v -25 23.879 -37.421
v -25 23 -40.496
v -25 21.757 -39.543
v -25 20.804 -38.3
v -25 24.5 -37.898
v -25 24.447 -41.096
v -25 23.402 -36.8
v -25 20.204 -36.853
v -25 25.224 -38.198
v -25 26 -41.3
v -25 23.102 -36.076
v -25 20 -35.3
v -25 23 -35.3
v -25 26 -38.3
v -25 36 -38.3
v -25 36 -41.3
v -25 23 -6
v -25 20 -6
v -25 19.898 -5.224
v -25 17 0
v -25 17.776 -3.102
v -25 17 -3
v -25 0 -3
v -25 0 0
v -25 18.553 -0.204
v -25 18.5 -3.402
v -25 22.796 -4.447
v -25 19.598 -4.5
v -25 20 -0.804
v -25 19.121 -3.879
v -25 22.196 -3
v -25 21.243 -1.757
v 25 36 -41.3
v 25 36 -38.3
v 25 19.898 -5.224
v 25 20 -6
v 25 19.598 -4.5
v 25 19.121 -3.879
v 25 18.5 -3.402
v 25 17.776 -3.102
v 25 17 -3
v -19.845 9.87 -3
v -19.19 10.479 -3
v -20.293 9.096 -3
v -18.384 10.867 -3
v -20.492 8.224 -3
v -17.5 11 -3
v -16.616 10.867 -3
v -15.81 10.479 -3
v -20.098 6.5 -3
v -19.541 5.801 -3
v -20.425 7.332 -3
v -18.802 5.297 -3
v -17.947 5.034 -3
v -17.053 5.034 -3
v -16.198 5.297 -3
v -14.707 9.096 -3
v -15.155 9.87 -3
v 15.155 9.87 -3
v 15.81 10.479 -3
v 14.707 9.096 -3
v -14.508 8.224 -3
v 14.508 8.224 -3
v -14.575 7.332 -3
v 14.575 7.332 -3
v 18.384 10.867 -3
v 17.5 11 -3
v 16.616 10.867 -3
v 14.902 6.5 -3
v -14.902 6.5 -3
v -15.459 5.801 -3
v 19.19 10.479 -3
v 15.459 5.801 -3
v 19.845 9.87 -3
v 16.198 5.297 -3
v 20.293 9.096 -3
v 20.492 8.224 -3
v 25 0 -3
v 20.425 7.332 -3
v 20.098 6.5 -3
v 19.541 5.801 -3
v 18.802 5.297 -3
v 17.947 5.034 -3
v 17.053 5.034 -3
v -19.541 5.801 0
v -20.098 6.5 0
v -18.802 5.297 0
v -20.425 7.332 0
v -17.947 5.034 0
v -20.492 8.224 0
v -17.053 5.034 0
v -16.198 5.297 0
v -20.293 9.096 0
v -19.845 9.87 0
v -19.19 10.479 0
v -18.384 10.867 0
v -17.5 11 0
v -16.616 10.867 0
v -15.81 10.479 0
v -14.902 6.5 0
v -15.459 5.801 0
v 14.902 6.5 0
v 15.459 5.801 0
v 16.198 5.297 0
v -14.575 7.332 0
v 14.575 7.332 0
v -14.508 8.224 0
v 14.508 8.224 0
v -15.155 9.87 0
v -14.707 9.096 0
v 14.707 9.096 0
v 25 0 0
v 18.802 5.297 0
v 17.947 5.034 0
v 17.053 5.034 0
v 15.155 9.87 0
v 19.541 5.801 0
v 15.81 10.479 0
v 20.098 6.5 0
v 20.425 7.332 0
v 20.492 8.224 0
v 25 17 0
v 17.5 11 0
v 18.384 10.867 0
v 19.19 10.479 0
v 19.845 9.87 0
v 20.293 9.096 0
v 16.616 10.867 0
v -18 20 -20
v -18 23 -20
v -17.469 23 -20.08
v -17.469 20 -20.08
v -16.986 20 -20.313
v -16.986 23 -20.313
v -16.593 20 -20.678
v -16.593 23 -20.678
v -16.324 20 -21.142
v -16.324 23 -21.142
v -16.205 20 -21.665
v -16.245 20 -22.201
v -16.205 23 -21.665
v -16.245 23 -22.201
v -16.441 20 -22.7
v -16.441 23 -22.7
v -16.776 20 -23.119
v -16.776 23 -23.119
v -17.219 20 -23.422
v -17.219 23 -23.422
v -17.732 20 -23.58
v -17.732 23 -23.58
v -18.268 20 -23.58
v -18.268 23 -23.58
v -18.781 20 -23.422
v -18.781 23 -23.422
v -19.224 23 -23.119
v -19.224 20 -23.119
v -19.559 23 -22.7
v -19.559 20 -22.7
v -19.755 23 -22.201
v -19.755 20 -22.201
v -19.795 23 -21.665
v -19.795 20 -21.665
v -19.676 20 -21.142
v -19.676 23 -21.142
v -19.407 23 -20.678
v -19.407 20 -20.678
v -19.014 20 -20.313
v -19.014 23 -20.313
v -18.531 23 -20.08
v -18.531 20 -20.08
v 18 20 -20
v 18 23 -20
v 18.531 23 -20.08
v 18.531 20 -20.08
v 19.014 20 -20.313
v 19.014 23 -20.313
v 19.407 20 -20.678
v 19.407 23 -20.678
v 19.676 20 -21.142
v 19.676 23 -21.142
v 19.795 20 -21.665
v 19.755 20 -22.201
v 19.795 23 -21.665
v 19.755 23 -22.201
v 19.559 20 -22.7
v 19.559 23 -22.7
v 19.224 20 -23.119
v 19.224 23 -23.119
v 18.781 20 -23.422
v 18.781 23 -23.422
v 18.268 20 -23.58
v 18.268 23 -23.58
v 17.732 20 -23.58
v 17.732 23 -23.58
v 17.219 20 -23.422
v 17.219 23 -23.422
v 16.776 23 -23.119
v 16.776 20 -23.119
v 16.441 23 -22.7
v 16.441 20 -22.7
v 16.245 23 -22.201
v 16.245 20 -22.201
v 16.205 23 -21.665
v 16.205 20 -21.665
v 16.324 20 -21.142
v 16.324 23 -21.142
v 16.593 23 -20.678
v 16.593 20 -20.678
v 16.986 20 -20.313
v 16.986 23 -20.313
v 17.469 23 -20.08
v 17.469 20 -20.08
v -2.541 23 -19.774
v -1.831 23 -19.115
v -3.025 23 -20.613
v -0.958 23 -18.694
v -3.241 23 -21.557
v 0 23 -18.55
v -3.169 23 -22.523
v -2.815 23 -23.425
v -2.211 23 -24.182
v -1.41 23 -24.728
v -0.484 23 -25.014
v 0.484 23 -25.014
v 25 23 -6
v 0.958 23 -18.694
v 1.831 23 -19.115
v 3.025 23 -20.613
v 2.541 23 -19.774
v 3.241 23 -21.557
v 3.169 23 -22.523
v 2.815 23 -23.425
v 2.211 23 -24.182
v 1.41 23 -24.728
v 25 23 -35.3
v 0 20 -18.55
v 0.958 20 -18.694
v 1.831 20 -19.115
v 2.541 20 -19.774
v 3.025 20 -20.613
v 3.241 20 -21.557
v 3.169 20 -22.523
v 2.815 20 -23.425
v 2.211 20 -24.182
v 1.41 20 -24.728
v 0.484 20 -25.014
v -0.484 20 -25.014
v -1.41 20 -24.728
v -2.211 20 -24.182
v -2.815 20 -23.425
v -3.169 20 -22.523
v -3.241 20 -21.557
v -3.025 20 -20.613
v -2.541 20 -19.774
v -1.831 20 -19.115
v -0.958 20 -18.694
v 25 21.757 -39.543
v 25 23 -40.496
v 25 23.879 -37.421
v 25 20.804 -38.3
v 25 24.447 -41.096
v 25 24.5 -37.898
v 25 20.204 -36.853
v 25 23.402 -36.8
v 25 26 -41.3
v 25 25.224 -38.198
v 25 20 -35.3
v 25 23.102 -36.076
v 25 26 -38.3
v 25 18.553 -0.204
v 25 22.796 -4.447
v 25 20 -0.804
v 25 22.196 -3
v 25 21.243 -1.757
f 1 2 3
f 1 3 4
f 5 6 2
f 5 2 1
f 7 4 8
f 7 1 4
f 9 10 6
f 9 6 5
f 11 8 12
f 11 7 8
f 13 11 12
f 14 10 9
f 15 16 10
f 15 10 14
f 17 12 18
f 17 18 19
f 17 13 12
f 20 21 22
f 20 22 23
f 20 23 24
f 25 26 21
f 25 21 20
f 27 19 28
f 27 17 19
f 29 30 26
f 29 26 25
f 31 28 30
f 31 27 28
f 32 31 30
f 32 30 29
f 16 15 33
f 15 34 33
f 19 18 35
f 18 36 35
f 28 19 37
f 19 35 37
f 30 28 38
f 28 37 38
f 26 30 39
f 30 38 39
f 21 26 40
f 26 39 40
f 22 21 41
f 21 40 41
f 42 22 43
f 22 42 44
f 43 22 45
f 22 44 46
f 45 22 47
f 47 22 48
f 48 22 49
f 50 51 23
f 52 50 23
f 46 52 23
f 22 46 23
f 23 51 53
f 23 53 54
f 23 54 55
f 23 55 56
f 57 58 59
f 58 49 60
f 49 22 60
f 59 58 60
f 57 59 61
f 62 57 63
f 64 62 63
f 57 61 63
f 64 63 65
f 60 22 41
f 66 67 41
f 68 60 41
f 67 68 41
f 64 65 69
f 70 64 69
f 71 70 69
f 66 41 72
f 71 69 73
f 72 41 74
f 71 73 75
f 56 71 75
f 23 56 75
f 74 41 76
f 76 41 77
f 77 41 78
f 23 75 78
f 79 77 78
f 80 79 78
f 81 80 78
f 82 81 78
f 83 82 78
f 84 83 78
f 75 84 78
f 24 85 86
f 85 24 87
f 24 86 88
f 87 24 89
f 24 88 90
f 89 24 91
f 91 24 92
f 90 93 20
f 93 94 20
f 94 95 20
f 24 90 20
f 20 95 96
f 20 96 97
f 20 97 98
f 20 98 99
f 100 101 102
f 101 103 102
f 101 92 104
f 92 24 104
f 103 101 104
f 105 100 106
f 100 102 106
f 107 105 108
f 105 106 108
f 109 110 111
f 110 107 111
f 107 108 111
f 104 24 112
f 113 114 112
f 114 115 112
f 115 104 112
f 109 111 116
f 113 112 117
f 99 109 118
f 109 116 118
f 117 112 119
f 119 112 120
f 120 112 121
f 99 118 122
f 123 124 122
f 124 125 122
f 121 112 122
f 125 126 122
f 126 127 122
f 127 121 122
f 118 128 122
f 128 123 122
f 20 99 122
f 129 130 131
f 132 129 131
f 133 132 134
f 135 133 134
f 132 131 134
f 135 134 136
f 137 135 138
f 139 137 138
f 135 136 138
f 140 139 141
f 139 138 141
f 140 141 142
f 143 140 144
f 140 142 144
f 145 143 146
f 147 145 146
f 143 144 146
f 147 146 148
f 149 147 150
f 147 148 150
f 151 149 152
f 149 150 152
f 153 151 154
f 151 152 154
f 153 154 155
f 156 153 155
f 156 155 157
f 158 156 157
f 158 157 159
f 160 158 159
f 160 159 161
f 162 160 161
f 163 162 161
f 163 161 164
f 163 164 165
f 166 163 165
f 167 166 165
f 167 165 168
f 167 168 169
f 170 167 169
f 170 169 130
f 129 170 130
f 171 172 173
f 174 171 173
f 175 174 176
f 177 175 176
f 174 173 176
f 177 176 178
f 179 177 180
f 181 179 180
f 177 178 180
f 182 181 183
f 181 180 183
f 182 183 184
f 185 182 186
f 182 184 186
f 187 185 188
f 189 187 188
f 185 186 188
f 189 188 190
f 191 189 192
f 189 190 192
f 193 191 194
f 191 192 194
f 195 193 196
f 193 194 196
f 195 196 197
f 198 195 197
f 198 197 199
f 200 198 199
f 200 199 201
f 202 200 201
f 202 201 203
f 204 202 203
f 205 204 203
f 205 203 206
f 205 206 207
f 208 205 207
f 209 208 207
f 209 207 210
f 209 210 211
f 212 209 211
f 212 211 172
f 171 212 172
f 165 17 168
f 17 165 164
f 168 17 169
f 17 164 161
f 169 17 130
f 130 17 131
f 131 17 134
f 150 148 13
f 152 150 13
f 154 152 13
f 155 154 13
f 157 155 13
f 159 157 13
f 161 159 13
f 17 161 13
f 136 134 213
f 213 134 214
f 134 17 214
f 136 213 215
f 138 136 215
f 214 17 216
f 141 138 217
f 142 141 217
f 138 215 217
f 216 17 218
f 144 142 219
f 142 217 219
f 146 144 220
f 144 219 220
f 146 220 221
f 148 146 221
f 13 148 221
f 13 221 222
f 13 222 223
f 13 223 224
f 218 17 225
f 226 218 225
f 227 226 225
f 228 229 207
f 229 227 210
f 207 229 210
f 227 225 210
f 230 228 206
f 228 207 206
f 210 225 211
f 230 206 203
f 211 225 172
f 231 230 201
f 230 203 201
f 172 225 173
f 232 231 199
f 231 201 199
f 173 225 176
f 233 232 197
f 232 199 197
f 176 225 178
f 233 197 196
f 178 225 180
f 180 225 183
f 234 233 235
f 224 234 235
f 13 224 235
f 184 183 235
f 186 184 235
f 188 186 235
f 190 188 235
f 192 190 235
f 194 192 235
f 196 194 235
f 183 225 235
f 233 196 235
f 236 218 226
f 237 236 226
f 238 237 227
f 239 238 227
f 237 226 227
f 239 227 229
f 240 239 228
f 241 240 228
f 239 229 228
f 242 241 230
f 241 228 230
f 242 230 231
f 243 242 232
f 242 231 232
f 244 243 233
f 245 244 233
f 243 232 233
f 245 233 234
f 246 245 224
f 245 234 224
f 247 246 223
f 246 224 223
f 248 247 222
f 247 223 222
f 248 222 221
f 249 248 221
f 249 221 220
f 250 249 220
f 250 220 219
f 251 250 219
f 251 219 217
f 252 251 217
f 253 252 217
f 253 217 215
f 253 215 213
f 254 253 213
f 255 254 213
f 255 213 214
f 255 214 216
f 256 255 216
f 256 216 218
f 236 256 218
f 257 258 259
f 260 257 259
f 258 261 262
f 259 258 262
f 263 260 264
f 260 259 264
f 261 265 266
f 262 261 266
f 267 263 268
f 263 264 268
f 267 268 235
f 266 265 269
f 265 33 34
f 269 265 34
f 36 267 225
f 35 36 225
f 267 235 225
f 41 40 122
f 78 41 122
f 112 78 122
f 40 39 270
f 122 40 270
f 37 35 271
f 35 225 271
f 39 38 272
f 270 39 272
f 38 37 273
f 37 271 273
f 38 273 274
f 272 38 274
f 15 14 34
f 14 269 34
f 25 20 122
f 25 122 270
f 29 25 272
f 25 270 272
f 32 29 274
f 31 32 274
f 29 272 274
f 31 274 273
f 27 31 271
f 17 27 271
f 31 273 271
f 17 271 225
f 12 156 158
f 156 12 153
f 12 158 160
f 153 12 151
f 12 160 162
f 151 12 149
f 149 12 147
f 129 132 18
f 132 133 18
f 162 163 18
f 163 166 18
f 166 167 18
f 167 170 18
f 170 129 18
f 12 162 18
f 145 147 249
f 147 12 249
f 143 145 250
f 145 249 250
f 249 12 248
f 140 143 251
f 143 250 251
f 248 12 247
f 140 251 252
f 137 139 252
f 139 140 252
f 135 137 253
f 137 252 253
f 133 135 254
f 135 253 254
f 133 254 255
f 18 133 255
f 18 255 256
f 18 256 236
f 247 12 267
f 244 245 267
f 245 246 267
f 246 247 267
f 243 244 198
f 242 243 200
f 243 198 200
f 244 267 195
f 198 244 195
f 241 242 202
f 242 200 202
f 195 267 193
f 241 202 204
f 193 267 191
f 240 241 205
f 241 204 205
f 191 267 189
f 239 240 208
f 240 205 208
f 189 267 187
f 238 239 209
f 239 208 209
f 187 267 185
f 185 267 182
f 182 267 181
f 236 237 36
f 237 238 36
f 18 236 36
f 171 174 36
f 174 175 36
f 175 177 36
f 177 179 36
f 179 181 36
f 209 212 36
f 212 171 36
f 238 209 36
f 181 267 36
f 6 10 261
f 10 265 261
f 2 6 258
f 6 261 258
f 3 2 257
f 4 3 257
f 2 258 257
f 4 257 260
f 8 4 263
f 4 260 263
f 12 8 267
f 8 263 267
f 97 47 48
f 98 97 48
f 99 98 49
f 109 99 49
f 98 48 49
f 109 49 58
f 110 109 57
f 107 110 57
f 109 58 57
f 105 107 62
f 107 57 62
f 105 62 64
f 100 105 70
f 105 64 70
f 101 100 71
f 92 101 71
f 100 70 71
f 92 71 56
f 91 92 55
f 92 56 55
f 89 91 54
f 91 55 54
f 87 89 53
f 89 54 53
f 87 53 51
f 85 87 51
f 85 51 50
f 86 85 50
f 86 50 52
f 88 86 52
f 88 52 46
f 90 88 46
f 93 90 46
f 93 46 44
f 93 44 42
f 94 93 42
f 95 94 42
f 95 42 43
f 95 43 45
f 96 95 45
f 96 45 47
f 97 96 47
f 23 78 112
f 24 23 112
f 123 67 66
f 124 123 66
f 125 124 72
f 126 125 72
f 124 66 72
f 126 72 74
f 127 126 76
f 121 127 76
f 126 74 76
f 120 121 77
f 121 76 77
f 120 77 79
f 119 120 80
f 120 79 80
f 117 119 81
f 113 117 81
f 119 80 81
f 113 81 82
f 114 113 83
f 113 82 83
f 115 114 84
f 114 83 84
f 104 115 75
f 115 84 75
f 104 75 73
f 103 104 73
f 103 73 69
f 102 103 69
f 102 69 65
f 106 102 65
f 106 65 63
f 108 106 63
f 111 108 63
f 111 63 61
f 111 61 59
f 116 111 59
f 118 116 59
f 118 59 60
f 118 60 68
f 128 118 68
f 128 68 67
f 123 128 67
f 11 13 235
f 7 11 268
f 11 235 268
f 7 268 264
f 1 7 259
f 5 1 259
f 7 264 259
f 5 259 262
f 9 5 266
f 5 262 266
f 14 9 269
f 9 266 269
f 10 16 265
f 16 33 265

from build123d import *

# Parameters (mm, degrees)
BOSS_EXTRUDE1_DEPTH = 25
CUT_EXTRUDE1_REACH  = 55.476
SKETCH2_R           = 3.25
SKETCH2_R_2         = 1.8
CUT_EXTRUDE2_REACH  = 60.206
SKETCH3_R           = 3


with BuildPart() as part:
    # Sketch1 → Boss-Extrude1 (new, symmetric)
    with BuildSketch(Plane(origin=(0, 0, 0), x_dir=(0, 0, -1), z_dir=(1, 0, 0))):
        with BuildLine():
            Line((0, 0), (0, 17))
            ThreePointArc((0, 17), (1.757359313, 21.242640687), (6, 23))
            Line((6, 23), (35.3, 23))
            ThreePointArc((35.3, 23), (37.421320344, 23.878679656), (38.3, 26))
            Line((38.3, 26), (38.3, 36))
            Line((38.3, 36), (41.3, 36))
            Line((41.3, 36), (41.3, 26))
            ThreePointArc((41.3, 26), (39.542640687, 21.757359313), (35.3, 20))
            Line((35.3, 20), (6, 20))
            ThreePointArc((6, 20), (3.878679656, 19.121320344), (3, 17))
            Line((3, 17), (3, 0))
            Line((3, 0), (0, 0))
        make_face()
    extrude(amount=BOSS_EXTRUDE1_DEPTH, both=True)

    # Sketch2 → Cut-Extrude1 (cut, up to next)
    with BuildSketch(Plane(origin=(0, 23, 0), x_dir=(1, 0, 0), z_dir=(0, 1, 0)), mode=Mode.PRIVATE) as cut_extrude1_sk1:
        with Locations(Location((0, 21.8, 0), (0, 0, 270))):
            Circle(SKETCH2_R)
    cut_extrude1_tool1 = extrude(cut_extrude1_sk1.sketch, amount=-CUT_EXTRUDE1_REACH, mode=Mode.PRIVATE) & part.part
    # Sketch2 → Cut-Extrude1 (cut, up to next)
    with BuildSketch(Plane(origin=(0, 23, 0), x_dir=(1, 0, 0), z_dir=(0, 1, 0)), mode=Mode.PRIVATE) as cut_extrude1_sk2:
        with Locations(Location((-18, 21.8, 0), (0, 0, 270))):
            Circle(SKETCH2_R_2)
    cut_extrude1_tool2 = extrude(cut_extrude1_sk2.sketch, amount=-CUT_EXTRUDE1_REACH, mode=Mode.PRIVATE) & part.part
    # Sketch2 → Cut-Extrude1 (cut, up to next)
    with BuildSketch(Plane(origin=(0, 23, 0), x_dir=(1, 0, 0), z_dir=(0, 1, 0)), mode=Mode.PRIVATE) as cut_extrude1_sk3:
        with Locations(Location((18, 21.8, 0), (0, 0, 270))):
            Circle(SKETCH2_R_2)
    cut_extrude1_tool3 = extrude(cut_extrude1_sk3.sketch, amount=-CUT_EXTRUDE1_REACH, mode=Mode.PRIVATE) & part.part
    add(cut_extrude1_tool1.solids().sort_by_distance((0, 23, -21.8))[0], mode=Mode.SUBTRACT)
    add(cut_extrude1_tool2.solids().sort_by_distance((-18, 23, -21.8))[0], mode=Mode.SUBTRACT)
    add(cut_extrude1_tool3.solids().sort_by_distance((18, 23, -21.8))[0], mode=Mode.SUBTRACT)

    # Sketch3 → Cut-Extrude2 (cut, up to next)
    with BuildSketch(Plane(origin=(0, 0, -3), x_dir=(-1, 0, 0), z_dir=(0, 0, -1)), mode=Mode.PRIVATE) as cut_extrude2_sk1:
        with Locations(Location((-17.5, 8, 0), (0, 0, 90))):
            Circle(SKETCH3_R)
    cut_extrude2_tool1 = extrude(cut_extrude2_sk1.sketch, amount=-CUT_EXTRUDE2_REACH, mode=Mode.PRIVATE) & part.part
    # Sketch3 → Cut-Extrude2 (cut, up to next)
    with BuildSketch(Plane(origin=(0, 0, -3), x_dir=(-1, 0, 0), z_dir=(0, 0, -1)), mode=Mode.PRIVATE) as cut_extrude2_sk2:
        with Locations(Location((17.5, 8, 0), (0, 0, 90))):
            Circle(SKETCH3_R)
    cut_extrude2_tool2 = extrude(cut_extrude2_sk2.sketch, amount=-CUT_EXTRUDE2_REACH, mode=Mode.PRIVATE) & part.part
    add(cut_extrude2_tool1.solids().sort_by_distance((17.5, 8, -3))[0], mode=Mode.SUBTRACT)
    add(cut_extrude2_tool2.solids().sort_by_distance((-17.5, 8, -3))[0], mode=Mode.SUBTRACT)


solid = part.part
